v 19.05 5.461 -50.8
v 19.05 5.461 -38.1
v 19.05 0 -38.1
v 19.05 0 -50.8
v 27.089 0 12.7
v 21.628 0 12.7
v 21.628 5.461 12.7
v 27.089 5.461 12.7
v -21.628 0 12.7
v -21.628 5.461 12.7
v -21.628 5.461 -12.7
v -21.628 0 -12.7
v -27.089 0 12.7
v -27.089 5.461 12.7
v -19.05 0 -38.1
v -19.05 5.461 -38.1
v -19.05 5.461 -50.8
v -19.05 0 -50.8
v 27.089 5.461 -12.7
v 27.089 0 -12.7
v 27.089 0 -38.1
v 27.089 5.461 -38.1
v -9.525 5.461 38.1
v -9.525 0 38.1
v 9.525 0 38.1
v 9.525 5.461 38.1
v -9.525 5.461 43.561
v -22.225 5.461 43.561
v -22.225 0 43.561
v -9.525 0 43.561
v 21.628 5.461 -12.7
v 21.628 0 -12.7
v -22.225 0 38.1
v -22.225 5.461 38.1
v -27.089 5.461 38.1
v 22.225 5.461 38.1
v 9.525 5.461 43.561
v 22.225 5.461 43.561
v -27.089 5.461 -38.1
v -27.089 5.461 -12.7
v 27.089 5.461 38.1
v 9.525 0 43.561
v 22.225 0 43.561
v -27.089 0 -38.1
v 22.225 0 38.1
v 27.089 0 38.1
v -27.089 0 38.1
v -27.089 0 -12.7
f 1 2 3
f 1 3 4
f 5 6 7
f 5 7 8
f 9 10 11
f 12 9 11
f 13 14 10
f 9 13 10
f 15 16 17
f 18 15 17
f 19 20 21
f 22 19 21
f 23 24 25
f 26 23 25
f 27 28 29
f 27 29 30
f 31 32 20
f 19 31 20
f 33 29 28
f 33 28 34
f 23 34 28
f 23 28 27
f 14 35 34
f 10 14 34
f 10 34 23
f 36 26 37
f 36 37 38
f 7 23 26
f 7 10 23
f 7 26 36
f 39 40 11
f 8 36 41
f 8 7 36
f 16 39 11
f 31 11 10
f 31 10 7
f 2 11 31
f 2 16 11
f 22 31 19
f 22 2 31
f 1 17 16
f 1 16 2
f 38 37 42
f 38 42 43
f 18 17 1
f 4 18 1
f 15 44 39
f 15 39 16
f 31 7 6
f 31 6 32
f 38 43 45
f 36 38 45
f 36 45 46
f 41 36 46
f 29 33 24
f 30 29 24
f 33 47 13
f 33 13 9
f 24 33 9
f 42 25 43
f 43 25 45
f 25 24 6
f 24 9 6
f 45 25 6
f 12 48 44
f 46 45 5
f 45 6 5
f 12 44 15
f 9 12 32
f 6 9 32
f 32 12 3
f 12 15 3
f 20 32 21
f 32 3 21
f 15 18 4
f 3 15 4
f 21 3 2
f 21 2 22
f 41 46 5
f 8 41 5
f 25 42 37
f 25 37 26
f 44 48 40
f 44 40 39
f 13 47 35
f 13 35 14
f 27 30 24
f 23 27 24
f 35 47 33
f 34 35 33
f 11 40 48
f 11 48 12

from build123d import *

# Parameters (mm, degrees)
SKETCH1_W           = 54.1782
SKETCH1_H           = 76.2
BOSS_EXTRUDE1_DEPTH = 5.461
SKETCH2_W           = 12.7
SKETCH2_H           = 5.461
SKETCH2_W_2         = 38.1
SKETCH2_H_2         = 12.7
BOSS_EXTRUDE2_DEPTH = 5.461
SKETCH3_W           = 5.461
SKETCH3_H           = 25.4
CUT_EXTRUDE1_DEPTH  = 6.461


with BuildPart() as part:
    # Sketch1 → Boss-Extrude1 (new body)
    with BuildSketch(Plane(origin=(0, 0, 0), x_dir=(1, 0, 0), z_dir=(0, 1, 0))):
        Rectangle(SKETCH1_W, SKETCH1_H)
    extrude(amount=BOSS_EXTRUDE1_DEPTH)

    # Sketch2 → Boss-Extrude2 (add)
    with BuildSketch(Plane(origin=(0, 5.461, 0), x_dir=(1, 0, 0), z_dir=(0, 1, 0))):
        with Locations((-15.875, -40.8305)):
            Rectangle(SKETCH2_W, SKETCH2_H)
        with Locations((15.875, -40.8305)):
            Rectangle(SKETCH2_W, SKETCH2_H)
        with Locations((0, 44.45)):
            Rectangle(SKETCH2_W_2, SKETCH2_H_2)
    extrude(amount=-BOSS_EXTRUDE2_DEPTH)

    # Sketch3 → Cut-Extrude1 (cut, through all)
    with BuildSketch(Plane(origin=(0, 5.461, 0), x_dir=(1, 0, 0), z_dir=(0, 1, 0))):
        with Locations((-24.3586, 0)):
            Rectangle(SKETCH3_W, SKETCH3_H)
        with Locations((24.3586, 0)):
            Rectangle(SKETCH3_W, SKETCH3_H)
    extrude(amount=-CUT_EXTRUDE1_DEPTH, mode=Mode.SUBTRACT)


solid = part.part
